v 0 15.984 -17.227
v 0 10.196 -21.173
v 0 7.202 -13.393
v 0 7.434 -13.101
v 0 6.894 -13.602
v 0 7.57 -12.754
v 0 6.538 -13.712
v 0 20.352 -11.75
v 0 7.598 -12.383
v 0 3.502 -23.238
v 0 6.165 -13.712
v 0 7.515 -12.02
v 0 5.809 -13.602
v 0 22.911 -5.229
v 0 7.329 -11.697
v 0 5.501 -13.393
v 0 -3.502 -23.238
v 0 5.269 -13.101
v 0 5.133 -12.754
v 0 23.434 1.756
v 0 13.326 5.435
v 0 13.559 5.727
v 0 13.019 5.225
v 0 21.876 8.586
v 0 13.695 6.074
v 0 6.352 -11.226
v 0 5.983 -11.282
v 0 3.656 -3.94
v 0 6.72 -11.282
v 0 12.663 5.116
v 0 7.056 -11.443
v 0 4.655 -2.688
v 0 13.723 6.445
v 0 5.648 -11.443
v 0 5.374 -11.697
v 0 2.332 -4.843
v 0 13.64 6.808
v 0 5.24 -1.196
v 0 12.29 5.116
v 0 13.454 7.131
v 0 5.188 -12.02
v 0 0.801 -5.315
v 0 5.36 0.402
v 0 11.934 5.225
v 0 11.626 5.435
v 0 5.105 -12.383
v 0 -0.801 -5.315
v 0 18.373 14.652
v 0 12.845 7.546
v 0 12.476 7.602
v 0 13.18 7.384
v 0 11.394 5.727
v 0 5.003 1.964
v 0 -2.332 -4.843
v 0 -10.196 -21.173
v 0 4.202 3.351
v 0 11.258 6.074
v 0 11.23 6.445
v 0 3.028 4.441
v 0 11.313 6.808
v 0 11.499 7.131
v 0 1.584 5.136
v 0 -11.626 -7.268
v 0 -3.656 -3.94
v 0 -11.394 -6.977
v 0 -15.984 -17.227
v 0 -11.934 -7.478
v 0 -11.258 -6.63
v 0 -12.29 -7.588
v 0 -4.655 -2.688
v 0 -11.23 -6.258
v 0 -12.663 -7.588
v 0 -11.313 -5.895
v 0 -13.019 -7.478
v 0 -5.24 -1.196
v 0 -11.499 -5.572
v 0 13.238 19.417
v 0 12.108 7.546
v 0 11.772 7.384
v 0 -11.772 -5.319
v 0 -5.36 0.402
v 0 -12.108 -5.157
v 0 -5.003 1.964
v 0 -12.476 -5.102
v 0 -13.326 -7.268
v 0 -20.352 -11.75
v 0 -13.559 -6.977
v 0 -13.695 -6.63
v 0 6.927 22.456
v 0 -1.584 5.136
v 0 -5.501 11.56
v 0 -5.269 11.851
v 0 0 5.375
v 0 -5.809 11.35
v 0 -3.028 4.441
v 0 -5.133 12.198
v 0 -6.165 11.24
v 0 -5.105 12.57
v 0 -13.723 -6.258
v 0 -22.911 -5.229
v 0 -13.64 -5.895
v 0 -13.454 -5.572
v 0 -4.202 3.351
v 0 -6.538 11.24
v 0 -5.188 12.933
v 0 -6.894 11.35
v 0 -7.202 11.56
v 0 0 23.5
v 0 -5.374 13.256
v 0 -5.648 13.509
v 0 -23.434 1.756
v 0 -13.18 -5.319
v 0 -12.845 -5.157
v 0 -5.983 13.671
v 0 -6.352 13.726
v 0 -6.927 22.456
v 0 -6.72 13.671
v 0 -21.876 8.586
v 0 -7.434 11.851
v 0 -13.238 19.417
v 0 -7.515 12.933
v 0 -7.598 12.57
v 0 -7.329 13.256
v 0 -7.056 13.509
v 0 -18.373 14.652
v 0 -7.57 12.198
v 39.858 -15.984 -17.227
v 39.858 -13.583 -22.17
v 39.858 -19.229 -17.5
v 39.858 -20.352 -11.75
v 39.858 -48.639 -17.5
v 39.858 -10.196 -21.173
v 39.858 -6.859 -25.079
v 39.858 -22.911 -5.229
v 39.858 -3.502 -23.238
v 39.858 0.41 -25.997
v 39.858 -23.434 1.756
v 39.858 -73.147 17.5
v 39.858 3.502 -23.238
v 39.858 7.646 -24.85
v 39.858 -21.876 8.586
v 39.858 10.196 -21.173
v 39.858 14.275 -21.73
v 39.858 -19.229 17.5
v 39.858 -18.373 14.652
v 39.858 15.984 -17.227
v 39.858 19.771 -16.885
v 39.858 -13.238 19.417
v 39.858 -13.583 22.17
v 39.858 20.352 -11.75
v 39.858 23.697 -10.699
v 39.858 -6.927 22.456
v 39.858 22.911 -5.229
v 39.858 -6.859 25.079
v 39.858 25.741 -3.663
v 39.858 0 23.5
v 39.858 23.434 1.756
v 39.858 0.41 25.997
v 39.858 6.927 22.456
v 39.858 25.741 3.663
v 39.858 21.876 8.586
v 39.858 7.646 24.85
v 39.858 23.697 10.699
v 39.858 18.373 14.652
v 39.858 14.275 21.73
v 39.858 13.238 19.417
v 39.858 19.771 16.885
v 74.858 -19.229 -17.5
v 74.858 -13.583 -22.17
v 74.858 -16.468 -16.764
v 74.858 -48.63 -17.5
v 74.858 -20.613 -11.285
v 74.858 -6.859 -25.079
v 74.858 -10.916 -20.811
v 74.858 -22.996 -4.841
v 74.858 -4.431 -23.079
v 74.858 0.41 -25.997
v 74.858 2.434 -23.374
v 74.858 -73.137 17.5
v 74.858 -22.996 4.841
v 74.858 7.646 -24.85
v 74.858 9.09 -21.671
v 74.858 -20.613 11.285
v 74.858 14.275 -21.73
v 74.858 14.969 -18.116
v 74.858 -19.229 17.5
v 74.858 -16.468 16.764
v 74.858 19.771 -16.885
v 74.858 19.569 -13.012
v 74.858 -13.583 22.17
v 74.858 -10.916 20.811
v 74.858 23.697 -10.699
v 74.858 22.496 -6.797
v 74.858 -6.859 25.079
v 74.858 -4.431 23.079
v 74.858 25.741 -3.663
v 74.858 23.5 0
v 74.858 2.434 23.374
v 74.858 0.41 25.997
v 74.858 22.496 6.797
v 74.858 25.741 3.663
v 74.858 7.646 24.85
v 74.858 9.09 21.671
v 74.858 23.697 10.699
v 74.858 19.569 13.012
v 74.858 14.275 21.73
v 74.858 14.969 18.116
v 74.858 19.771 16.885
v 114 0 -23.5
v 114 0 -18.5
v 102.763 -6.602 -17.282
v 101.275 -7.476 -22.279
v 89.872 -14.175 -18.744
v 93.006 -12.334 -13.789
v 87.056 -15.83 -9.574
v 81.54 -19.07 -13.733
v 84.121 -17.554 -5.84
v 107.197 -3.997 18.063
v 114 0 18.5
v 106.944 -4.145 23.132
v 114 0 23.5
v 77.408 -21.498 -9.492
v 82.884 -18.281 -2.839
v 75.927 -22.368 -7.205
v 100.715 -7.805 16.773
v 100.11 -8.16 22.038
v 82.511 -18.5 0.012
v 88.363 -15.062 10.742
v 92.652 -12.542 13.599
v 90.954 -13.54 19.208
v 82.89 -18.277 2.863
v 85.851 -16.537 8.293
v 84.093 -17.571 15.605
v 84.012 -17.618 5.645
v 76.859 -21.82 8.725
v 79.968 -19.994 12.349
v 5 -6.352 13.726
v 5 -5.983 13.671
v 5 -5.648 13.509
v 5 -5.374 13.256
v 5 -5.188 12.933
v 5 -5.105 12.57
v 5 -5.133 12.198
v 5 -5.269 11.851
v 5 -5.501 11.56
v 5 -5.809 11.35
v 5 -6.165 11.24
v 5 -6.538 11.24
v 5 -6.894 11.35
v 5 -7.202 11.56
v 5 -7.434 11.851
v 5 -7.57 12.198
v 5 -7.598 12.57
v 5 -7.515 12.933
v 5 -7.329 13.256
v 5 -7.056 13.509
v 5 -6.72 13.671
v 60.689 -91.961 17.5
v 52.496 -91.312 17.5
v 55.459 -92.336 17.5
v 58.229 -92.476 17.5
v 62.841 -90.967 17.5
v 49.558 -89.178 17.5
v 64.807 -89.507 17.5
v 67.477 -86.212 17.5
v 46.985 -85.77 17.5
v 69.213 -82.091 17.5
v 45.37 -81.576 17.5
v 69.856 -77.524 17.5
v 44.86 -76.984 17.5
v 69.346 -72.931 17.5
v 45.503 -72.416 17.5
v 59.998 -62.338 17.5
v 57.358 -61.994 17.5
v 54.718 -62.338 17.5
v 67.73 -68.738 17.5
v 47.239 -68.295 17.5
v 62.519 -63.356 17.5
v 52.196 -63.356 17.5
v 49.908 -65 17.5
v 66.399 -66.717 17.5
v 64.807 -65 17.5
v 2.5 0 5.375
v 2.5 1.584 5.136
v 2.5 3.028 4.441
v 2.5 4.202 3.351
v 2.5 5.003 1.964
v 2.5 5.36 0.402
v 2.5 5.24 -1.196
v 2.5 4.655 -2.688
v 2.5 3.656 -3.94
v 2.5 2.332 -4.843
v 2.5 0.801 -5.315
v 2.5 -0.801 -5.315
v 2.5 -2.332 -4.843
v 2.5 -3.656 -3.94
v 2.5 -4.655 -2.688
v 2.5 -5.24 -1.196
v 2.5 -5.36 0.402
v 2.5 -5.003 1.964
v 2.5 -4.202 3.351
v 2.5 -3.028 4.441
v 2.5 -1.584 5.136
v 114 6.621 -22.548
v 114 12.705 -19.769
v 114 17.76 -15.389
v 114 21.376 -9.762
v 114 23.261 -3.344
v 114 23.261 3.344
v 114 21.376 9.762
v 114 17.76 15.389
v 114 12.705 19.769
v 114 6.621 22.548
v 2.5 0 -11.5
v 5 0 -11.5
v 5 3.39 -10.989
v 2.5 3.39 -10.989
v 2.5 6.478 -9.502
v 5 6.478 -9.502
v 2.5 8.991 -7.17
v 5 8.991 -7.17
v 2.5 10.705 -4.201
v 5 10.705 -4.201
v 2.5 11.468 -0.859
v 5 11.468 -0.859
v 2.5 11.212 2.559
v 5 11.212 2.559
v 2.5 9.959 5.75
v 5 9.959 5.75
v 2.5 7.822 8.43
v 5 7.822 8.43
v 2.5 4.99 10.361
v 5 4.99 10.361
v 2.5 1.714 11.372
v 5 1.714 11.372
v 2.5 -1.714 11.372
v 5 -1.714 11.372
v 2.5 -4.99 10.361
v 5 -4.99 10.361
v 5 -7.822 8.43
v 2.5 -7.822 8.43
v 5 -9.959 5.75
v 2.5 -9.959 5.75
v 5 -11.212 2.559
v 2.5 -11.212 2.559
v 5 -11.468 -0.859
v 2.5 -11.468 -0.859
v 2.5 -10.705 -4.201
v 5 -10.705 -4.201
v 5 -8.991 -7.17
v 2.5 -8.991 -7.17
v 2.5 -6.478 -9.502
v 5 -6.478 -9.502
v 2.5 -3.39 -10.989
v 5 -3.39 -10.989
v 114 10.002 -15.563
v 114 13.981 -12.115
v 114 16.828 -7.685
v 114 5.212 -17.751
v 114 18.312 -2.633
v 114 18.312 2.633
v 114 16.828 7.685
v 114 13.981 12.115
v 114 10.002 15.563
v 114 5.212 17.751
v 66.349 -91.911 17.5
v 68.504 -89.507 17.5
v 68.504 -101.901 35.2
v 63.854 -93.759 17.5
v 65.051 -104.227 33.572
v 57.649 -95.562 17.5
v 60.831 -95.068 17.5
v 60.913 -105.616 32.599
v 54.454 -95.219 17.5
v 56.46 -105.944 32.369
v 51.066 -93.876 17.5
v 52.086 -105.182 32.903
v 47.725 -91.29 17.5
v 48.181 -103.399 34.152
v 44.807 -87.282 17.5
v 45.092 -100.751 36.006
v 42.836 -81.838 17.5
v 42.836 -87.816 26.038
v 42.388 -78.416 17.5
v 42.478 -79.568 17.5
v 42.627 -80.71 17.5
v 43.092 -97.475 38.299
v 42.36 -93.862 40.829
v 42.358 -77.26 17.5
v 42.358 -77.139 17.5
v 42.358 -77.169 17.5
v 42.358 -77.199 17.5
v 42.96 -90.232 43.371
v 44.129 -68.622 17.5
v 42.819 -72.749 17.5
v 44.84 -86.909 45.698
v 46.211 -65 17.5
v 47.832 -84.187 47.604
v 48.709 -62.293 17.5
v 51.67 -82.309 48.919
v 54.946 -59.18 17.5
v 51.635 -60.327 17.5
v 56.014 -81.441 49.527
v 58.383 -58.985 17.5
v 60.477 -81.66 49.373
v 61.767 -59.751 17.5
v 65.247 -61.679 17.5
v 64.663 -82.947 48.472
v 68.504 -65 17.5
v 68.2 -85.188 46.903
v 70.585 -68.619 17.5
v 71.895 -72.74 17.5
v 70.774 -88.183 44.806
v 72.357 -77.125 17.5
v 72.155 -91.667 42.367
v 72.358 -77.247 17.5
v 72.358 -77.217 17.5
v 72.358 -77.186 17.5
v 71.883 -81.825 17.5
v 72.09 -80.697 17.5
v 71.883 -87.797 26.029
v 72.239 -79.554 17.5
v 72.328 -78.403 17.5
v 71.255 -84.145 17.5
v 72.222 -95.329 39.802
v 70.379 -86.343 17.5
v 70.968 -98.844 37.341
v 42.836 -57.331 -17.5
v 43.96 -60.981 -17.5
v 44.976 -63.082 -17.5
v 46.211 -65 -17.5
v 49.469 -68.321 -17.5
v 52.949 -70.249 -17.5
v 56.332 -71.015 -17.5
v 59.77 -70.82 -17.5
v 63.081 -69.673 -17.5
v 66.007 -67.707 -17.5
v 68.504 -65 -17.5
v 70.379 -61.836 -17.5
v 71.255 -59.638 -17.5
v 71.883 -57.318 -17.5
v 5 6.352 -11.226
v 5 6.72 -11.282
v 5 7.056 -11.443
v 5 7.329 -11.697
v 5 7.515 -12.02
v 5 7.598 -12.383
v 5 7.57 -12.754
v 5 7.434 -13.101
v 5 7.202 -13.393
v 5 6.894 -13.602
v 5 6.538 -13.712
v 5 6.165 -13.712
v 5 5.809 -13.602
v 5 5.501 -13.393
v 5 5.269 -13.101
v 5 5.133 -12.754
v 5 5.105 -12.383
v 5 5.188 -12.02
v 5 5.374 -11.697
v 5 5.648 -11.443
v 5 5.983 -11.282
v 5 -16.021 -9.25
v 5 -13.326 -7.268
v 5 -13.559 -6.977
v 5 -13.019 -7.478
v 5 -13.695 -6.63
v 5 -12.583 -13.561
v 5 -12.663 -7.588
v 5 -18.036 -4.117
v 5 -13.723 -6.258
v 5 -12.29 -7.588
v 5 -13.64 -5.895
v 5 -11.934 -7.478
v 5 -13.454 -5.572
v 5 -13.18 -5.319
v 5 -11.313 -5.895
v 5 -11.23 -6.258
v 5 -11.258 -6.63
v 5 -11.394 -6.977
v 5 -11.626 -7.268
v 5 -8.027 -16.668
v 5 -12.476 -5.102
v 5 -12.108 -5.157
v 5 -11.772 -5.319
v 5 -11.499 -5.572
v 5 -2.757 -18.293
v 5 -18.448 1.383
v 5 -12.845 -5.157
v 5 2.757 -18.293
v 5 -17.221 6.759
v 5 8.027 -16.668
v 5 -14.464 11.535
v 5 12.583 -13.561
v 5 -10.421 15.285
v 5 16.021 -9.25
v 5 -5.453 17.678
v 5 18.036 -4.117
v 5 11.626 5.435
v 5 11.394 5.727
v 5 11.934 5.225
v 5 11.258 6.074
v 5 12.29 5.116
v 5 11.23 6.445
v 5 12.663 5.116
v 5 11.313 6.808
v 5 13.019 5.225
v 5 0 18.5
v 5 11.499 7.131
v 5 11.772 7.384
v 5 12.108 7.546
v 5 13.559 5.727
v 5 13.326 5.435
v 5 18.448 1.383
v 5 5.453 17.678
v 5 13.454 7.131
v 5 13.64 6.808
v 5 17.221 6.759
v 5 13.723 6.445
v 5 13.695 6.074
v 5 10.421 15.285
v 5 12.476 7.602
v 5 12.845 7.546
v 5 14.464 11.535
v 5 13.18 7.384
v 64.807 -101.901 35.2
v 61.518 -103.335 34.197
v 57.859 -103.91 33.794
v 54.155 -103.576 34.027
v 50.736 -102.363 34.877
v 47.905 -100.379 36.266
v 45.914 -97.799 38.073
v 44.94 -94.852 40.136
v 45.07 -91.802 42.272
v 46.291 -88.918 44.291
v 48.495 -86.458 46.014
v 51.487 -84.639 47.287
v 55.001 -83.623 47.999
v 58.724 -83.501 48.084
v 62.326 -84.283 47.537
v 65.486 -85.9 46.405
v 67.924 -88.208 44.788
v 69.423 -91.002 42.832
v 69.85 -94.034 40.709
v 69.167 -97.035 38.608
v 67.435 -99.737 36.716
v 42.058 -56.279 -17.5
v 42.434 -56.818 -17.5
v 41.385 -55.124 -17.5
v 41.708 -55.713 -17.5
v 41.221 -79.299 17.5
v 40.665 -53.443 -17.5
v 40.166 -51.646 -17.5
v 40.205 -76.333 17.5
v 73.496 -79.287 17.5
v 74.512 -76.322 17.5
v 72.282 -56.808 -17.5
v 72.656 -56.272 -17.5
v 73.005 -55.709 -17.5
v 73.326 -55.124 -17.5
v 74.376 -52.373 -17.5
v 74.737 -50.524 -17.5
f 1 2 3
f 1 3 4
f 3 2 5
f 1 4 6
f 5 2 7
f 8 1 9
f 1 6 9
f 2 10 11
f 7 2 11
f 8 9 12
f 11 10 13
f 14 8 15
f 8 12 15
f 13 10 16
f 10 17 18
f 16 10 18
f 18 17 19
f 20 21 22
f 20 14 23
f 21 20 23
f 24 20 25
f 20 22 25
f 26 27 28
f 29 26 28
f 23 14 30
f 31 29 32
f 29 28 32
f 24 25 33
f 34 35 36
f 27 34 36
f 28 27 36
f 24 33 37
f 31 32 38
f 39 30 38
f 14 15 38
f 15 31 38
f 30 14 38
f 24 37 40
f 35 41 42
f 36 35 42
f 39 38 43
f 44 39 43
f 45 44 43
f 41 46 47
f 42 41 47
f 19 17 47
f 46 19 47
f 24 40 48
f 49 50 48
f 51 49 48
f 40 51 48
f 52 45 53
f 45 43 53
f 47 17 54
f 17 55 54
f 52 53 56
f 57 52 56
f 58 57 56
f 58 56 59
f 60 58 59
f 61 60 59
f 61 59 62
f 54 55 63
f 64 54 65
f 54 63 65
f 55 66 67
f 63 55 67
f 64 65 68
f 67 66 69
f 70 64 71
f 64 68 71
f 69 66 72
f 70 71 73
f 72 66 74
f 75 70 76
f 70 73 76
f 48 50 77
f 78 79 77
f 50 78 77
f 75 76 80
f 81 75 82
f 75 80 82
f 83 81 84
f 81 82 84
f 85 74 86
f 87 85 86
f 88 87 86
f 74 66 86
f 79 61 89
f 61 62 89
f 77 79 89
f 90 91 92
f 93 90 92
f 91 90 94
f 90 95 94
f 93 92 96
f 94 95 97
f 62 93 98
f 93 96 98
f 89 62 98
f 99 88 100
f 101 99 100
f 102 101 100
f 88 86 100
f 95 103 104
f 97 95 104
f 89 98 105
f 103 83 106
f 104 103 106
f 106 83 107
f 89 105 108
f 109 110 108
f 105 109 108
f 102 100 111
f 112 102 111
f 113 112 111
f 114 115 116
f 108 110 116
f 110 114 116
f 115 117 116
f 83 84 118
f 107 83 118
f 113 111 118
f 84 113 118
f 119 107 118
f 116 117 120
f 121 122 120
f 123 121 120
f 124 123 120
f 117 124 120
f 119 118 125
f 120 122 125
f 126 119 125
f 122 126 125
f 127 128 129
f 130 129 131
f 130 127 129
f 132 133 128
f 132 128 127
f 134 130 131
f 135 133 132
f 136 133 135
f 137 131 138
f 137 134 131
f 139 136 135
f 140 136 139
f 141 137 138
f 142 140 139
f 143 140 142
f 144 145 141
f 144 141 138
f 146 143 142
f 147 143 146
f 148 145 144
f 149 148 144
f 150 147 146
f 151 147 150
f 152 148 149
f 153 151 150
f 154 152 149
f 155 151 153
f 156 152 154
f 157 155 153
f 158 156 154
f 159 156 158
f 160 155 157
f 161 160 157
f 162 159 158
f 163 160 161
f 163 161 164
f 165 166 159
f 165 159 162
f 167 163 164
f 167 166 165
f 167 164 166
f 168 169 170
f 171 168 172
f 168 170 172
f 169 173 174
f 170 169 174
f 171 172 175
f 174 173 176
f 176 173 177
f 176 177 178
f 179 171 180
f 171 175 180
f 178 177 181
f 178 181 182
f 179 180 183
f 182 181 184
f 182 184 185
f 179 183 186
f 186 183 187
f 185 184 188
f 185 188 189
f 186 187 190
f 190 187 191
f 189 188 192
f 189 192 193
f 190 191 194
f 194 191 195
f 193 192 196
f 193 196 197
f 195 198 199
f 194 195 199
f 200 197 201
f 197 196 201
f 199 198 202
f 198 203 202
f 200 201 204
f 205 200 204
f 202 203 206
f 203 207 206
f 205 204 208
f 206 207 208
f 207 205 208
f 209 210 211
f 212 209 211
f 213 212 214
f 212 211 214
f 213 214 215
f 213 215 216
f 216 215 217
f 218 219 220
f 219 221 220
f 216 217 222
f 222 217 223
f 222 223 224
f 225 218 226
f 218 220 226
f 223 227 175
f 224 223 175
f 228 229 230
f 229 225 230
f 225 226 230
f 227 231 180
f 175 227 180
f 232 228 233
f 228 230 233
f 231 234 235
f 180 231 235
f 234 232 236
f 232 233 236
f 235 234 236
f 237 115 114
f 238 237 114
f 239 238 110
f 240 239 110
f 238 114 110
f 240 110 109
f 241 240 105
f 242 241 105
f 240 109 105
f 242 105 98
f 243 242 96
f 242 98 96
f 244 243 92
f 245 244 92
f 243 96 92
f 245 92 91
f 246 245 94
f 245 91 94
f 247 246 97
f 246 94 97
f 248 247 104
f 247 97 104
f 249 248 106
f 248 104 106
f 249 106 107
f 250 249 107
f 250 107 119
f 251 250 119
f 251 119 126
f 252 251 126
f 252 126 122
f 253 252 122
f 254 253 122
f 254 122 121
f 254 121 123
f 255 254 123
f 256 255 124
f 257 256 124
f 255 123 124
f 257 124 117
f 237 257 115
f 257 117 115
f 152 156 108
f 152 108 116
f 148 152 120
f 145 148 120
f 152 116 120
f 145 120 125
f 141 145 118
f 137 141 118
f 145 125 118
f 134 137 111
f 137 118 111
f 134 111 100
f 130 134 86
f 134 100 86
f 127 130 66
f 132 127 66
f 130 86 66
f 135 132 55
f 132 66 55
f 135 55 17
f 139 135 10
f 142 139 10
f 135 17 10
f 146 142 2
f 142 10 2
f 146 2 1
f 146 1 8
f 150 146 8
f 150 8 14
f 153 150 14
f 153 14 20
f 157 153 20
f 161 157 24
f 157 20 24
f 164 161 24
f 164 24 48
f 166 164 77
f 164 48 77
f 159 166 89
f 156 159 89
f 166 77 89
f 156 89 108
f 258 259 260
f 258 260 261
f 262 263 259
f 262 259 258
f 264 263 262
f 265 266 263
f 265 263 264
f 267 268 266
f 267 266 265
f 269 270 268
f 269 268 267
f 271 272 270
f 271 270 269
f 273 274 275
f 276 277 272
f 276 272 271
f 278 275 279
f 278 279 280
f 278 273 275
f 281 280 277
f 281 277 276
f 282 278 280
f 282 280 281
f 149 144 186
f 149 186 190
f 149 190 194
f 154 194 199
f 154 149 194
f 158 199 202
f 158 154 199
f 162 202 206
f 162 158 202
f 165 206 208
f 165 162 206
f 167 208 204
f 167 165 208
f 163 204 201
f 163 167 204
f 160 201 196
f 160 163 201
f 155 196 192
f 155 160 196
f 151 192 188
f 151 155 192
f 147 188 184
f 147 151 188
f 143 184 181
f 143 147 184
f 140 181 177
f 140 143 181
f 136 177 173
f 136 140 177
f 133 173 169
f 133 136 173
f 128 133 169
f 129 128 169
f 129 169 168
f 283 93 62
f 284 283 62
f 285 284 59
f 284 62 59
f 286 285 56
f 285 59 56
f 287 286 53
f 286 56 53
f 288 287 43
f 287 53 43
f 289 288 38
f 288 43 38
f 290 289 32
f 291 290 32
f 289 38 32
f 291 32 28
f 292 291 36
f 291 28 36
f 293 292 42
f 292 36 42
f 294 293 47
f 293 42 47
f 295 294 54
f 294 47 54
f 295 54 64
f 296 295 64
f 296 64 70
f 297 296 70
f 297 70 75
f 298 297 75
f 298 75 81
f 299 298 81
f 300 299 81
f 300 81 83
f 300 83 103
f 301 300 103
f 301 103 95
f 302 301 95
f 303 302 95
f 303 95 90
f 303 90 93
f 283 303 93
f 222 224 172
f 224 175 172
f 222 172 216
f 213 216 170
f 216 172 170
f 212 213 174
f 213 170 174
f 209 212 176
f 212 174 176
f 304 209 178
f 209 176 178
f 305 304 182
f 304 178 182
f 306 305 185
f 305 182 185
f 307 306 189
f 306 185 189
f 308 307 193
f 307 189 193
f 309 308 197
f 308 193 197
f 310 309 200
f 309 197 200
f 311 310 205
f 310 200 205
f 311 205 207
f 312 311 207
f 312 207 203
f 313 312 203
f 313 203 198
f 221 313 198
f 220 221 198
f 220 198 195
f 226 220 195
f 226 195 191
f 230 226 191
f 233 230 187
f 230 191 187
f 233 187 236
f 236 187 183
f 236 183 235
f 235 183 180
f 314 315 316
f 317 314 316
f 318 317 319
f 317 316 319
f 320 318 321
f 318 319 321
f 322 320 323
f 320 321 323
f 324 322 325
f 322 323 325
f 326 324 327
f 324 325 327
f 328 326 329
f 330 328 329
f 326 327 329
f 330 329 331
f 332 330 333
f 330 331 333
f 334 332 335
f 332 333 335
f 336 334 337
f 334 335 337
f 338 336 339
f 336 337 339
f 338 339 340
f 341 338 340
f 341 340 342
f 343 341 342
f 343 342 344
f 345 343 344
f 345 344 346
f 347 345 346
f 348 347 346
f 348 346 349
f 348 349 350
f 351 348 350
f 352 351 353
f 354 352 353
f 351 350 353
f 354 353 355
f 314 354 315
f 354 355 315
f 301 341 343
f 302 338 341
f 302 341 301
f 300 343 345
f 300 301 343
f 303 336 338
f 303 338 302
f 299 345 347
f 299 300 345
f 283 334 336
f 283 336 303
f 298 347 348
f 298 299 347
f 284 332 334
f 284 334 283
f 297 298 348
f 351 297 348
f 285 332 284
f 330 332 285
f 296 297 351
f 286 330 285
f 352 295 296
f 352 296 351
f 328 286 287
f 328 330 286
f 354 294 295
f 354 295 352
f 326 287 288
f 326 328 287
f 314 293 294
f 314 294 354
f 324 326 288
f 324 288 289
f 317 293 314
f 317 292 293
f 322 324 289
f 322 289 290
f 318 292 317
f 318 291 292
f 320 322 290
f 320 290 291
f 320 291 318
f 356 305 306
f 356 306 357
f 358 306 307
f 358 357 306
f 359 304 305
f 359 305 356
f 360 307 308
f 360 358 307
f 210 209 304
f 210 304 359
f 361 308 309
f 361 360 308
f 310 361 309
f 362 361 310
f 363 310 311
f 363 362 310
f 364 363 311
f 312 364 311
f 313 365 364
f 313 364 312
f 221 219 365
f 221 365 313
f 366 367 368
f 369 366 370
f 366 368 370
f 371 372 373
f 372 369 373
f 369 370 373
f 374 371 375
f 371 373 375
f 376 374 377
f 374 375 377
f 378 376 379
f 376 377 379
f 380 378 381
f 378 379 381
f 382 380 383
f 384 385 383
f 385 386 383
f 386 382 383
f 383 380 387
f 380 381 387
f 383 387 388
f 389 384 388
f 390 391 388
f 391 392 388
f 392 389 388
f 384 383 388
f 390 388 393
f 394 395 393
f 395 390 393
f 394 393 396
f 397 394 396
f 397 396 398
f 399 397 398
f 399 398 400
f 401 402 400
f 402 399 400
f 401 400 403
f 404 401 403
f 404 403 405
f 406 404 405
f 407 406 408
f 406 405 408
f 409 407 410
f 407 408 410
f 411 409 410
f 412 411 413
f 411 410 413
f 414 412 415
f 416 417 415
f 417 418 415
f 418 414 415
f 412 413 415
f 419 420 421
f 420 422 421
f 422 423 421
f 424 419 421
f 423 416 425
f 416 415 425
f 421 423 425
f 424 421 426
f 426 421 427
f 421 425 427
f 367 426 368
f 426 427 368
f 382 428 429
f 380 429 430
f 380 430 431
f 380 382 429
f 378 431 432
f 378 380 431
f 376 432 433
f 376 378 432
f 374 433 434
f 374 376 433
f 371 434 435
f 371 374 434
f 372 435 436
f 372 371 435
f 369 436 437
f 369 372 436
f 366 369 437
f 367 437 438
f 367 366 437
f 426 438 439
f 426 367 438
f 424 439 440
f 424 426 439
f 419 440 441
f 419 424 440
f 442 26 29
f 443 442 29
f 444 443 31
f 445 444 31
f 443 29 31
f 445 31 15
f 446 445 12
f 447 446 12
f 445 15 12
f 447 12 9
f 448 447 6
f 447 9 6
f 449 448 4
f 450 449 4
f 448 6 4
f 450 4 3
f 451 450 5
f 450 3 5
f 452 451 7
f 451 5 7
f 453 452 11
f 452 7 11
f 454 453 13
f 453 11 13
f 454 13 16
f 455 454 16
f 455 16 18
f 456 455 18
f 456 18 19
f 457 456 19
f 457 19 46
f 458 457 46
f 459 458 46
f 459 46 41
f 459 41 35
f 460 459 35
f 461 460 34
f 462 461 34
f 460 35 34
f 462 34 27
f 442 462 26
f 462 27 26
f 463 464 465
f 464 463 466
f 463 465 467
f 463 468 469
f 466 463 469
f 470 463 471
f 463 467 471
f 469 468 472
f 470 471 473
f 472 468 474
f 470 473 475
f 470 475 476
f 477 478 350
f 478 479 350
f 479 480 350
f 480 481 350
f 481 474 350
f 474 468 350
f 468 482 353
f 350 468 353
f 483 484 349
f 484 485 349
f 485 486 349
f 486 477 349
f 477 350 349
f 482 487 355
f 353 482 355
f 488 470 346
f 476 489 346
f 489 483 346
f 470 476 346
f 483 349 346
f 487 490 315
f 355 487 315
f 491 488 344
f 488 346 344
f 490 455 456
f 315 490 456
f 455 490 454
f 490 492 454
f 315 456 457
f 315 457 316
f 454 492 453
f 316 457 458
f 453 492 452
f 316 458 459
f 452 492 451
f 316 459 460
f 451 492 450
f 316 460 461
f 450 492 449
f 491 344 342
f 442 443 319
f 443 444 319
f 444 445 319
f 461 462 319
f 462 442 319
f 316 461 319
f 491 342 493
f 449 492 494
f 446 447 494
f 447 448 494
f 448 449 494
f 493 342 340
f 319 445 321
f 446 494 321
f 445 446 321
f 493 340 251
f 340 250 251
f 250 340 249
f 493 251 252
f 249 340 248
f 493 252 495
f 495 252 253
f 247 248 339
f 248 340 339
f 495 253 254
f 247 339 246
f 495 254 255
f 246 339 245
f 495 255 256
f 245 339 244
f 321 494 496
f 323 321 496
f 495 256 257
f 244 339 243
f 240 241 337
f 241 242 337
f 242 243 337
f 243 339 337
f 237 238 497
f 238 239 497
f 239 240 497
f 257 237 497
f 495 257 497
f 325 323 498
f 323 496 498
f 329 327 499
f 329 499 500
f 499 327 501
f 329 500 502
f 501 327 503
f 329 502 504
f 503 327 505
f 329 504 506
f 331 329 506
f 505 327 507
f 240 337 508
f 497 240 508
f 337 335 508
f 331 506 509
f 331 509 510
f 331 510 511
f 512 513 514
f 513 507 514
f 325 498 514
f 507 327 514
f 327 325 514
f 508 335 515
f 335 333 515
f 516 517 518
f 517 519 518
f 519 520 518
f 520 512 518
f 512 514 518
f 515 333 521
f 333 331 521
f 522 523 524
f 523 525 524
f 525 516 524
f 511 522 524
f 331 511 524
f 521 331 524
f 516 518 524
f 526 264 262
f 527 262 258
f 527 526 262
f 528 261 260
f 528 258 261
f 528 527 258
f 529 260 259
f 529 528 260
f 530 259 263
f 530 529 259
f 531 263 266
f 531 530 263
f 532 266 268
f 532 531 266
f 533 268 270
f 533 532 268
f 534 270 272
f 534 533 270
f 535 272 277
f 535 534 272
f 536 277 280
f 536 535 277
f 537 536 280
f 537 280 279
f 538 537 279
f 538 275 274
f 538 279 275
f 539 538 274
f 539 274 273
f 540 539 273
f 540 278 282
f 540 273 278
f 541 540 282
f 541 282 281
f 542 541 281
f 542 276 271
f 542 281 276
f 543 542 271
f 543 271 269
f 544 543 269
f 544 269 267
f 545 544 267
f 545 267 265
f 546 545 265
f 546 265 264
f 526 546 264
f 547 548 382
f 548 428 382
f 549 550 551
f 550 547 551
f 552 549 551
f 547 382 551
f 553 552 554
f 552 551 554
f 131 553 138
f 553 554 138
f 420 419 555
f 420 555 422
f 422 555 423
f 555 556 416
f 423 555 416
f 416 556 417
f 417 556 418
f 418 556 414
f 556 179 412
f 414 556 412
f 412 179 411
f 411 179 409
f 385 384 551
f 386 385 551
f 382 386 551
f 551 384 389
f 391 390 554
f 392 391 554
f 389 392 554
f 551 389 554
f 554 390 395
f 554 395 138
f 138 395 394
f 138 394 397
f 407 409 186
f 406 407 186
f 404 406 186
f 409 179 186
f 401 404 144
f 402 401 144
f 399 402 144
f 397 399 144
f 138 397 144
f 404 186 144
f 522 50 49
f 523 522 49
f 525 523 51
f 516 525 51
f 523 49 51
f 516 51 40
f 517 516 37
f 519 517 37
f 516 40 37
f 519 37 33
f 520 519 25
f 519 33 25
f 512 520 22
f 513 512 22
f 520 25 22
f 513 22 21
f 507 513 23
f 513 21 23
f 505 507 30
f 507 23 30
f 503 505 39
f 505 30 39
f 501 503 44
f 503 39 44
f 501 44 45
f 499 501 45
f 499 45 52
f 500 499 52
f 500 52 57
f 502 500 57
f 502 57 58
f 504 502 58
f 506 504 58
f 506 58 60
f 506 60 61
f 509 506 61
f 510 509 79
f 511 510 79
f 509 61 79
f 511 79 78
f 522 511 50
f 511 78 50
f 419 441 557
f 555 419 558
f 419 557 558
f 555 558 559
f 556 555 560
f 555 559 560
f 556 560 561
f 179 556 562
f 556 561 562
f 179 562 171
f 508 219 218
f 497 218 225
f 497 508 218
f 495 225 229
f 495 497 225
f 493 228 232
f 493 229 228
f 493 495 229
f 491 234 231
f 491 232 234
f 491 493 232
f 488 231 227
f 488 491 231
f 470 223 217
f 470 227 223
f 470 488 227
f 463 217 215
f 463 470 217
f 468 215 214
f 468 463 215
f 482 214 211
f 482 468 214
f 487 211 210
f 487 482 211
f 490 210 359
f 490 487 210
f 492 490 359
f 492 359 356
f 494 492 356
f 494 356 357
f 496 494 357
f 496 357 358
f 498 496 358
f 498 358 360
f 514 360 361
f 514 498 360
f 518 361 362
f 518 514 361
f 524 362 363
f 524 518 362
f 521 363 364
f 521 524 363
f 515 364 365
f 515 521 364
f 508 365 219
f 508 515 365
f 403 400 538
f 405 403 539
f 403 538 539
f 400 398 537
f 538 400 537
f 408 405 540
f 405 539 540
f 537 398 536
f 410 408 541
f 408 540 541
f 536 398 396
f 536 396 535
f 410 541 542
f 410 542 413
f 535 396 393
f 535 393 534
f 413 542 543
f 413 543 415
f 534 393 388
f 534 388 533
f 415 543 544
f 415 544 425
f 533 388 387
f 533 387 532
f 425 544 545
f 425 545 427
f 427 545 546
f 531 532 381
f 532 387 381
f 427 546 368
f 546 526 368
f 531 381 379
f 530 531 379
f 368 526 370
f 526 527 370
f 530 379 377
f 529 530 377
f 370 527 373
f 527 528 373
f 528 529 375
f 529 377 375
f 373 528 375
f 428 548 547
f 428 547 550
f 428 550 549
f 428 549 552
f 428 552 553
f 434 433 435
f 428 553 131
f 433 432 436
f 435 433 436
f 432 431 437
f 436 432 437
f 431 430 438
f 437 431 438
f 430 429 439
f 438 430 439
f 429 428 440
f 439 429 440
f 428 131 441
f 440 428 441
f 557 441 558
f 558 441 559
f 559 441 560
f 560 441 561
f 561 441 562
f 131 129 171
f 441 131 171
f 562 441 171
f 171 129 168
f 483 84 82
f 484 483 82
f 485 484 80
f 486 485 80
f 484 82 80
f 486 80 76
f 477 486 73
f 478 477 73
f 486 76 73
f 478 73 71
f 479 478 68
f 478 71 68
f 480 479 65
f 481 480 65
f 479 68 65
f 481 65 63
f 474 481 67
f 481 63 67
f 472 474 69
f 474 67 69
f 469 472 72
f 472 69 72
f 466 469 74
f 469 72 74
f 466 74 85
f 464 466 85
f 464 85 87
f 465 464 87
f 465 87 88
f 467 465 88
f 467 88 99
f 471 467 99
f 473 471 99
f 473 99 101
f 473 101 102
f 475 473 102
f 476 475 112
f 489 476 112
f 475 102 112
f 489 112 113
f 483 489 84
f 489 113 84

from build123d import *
from build123d.topology import SkipClean

# Parameters (mm, degrees)
CROQUIS1_R              = 23.5
CROQUIS1_R_2            = 18.5
SALIENTE_EXTRUIR1_DEPTH = 114
CROQUIS2_R              = 23.5
CROQUIS2_R_2            = 5.375
CROQUIS2_R_3            = 1.25
SALIENTE_EXTRUIR2_DEPTH = 5
CORTAR_EXTRUIR1_DEPTH   = 23.5
CROQUIS6_R              = 11.5
CORTAR_EXTRUIR2_DEPTH   = 2.5
CROQUIS17_W             = 35
CROQUIS17_H             = 35
SALIENTE_EXTRUIR3_DEPTH = 65
CROQUIS18_R             = 15
CROQUIS18_R_2           = 12.5
SALIENTE_EXTRUIR4_DEPTH = 70
CROQUIS26_W             = 35
CROQUIS26_H             = 35
SALIENTE_EXTRUIR8_DEPTH = 40
CORTAR_EXTRUIR4_DEPTH   = 167.48351172
REDONDEO1_R             = 10
CROQUIS27_R             = 26
SALIENTE_EXTRUIR9_DEPTH = 35
CORTAR_EXTRUIR7_START   = -35
CROQUIS28_R             = 18.5
CORTAR_EXTRUIR7_DEPTH   = 35
CROQUIS25_W             = 13.336801646
CROQUIS25_H             = 44.473979809
CORTAR_EXTRUIR8_DEPTH   = 35


with BuildPart() as part:
    # Croquis1 → Saliente-Extruir1 (new body)
    with BuildSketch(Plane(origin=(0, 0, 0), x_dir=(0, 0, -1), z_dir=(1, 0, 0))):
        with Locations(Location((0, 0, 0), (0, 0, 180))):
            Circle(CROQUIS1_R)
        with Locations(Location((0, 0, 0), (0, 0, 180))):
            Circle(CROQUIS1_R_2, mode=Mode.SUBTRACT)
    extrude(amount=SALIENTE_EXTRUIR1_DEPTH)

    # Croquis2 → Saliente-Extruir2 (add)
    with BuildSketch(Plane.ZY):
        Circle(CROQUIS2_R)
        Circle(CROQUIS2_R_2, mode=Mode.SUBTRACT)
        with Locations((-12.476232327, 6.351663319)):
            Circle(CROQUIS2_R_3, mode=Mode.SUBTRACT)
        with Locations((-6.351663319, -12.476232327)):
            Circle(CROQUIS2_R_3, mode=Mode.SUBTRACT)
        with Locations((12.476232327, -6.351663319)):
            Circle(CROQUIS2_R_3, mode=Mode.SUBTRACT)
        with Locations((6.351663319, 12.476232327)):
            Circle(CROQUIS2_R_3, mode=Mode.SUBTRACT)
    extrude(amount=-SALIENTE_EXTRUIR2_DEPTH)

    # Croquis4 → Cortar-Extruir1 (cut, symmetric)
    with BuildSketch(Plane.XY):
        Polygon((114, 0), (74, -23.5), (114, -23.5), align=None)
    extrude(amount=CORTAR_EXTRUIR1_DEPTH, both=True, mode=Mode.SUBTRACT)

    # Croquis6 → Cortar-Extruir2 (cut)
    with BuildSketch(Plane(origin=(5, 0, 0), x_dir=(0, 0, -1), z_dir=(1, 0, 0))):
        Circle(CROQUIS6_R)
    extrude(amount=-CORTAR_EXTRUIR2_DEPTH, mode=Mode.SUBTRACT)

    # Croquis17 → Saliente-Extruir3 (add)
    with BuildSketch(Plane(origin=(0, 0, 0), x_dir=(1, 0, 0), z_dir=(0, 1, 0))):
        with Locations((57.357864376, 0)):
            Rectangle(CROQUIS17_W, CROQUIS17_H)
    extrude(amount=-SALIENTE_EXTRUIR3_DEPTH)

    # Croquis18 → Saliente-Extruir4 (add)
    with BuildSketch(Plane(origin=(57.357864376, -93.678821818, 40.957602214), x_dir=(-1, 0, 0), z_dir=(3.885780586188049e-15, 0.5735764363510475, -0.8191520442889909))):
        with Locations(Location((0, 0, 0), (0, 0, 222.003230743))):
            Circle(CROQUIS18_R)
        with Locations(Location((0, 0, 0), (0, 0, 233.418217826))):
            Circle(CROQUIS18_R_2, mode=Mode.SUBTRACT)
    extrude(amount=SALIENTE_EXTRUIR4_DEPTH)

    # Croquis26 → Saliente-Extruir8 (add)
    with BuildSketch(Plane.XZ.offset(65)):
        with Locations((57.357864376, 0)):
            Rectangle(CROQUIS26_W, CROQUIS26_H)
    extrude(amount=SALIENTE_EXTRUIR8_DEPTH)

    # Croquis23 → Cortar-Extruir4 (cut, through all)
    with SkipClean():  # the faces are left unmerged after this step: merging them gives an invalid solid
        with BuildSketch(Plane(origin=(0, -50.063167159, 71.49761239), x_dir=(-0.9999999349220849, -0.00029552642887780036, -0.0002069298332451758), z_dir=(-3.88580769124236e-15, -0.5735764363510474, 0.819152044288991))):
            with BuildLine():
                Line((-72.338651426, 53.265572477), (-106.285107353, 53.265572477))
                ThreePointArc((-106.285107353, 53.265572477), (-57.338651426, 102.212028404), (-8.392195499, 53.265572477))
                Line((-8.392195499, 53.265572477), (-42.338651426, 53.265572477))
                ThreePointArc((-42.338651426, 53.265572477), (-57.338651426, 68.265572477), (-72.338651426, 53.265572477))
            make_face()
        extrude(amount=-CORTAR_EXTRUIR4_DEPTH, mode=Mode.SUBTRACT)

    # Chaflán1
    # the kernel refuses this chamfer: 5 mm, written as the material it adds along each edge
    with BuildSketch(Plane(origin=(72.3578634, -83.735162365, 26.766019567), x_dir=(0.9996237628252941, 0.0224682639001608, 0.015732447753382475), z_dir=(3.88580769124236e-15, 0.5735764363510474, -0.819152044288991))) as chafl_n1_piece_1_section:
        with BuildLine():
            Line((4.52468849, 0), (-0.739014204, 3.853882904))
            Line((-0.739014204, 3.853882904), (-0.835126609, 3.826271211))
            ThreePointArc((-0.835126609, 3.826271211), (-0.28053556, 1.941134087), (-0.099963359, -0.002706805))
            Line((-0.099963359, -0.002706805), (0.002706805, -0.099963359))
            ThreePointArc((0.002706805, -0.099963359), (2.263393477, -0.038748553), (4.527395295, -0.099963359))
            Line((4.527395295, -0.099963359), (4.52468849, 0))
        make_face()
    chafl_n1_piece_1 = extrude(amount=65.350553059, mode=Mode.PRIVATE)
    chafl_n1_piece_1 = split(chafl_n1_piece_1, bisect_by=Plane(origin=(74.857864376, -66.849730794, 0.212642444), z_dir=(-1, 0, 0)), keep=Keep.TOP, mode=Mode.PRIVATE)
    chafl_n1_piece_1 = split(chafl_n1_piece_1, bisect_by=Plane(origin=(73.269970471, -66.849730794, -17.5), z_dir=(0, 0, 1)), keep=Keep.TOP, mode=Mode.PRIVATE)
    chafl_n1_piece_1 = split(chafl_n1_piece_1, bisect_by=Plane(origin=(73.269970471, -66.849730794, 17.5), z_dir=(0, 0, -1)), keep=Keep.TOP, mode=Mode.PRIVATE)
    chafl_n1_piece_1 = split(chafl_n1_piece_1, bisect_by=Plane(origin=(73.269970471, -54.669749998, -17.182172852), z_dir=(-3.8857805861880495e-15, -0.5735764363510475, 0.8191520442889909)), keep=Keep.TOP, mode=Mode.PRIVATE)
    add(chafl_n1_piece_1)
    with BuildSketch(Plane(origin=(72.3578634, -83.735162365, 26.766019567), x_dir=(0.9996237628252941, 0.0224682639001608, 0.015732447753382475), z_dir=(3.88580769124236e-15, 0.5735764363510474, -0.819152044288991))) as chafl_n1_piece_2_section:
        with BuildLine():
            Line((4.52468849, 0), (-0.739014204, 3.853882904))
            Line((-0.739014204, 3.853882904), (-0.835126609, 3.826271211))
            ThreePointArc((-0.835126609, 3.826271211), (-0.28053556, 1.941134087), (-0.099963359, -0.002706805))
            Line((-0.099963359, -0.002706805), (0.002706805, -0.099963359))
            ThreePointArc((0.002706805, -0.099963359), (2.263393477, -0.038748553), (4.527395295, -0.099963359))
            Line((4.527395295, -0.099963359), (4.52468849, 0))
        make_face()
    chafl_n1_piece_2 = extrude(amount=65.350553059, mode=Mode.PRIVATE)
    chafl_n1_piece_2 = split(chafl_n1_piece_2, bisect_by=Plane(origin=(72.410675533, -56.139333536, -17.5), z_dir=(0, 0, -1)), keep=Keep.TOP, mode=Mode.PRIVATE)
    chafl_n1_piece_2 = split(chafl_n1_piece_2, bisect_by=Plane(origin=(72.410675533, -55.939365699, -18.071167337), z_dir=(-3.8857805861880495e-15, -0.5735764363510475, 0.8191520442889909)), keep=Keep.TOP, mode=Mode.PRIVATE)
    add(chafl_n1_piece_2)
    with BuildSketch(Plane(origin=(72.3578634, -83.735162365, 26.766019567), x_dir=(0.9996237628252941, 0.0224682639001608, 0.015732447753382475), z_dir=(3.88580769124236e-15, 0.5735764363510474, -0.819152044288991))) as chafl_n1_piece_3_section:
        with BuildLine():
            Line((4.52468849, 0), (-0.739014204, 3.853882904))
            Line((-0.739014204, 3.853882904), (-0.835126609, 3.826271211))
            ThreePointArc((-0.835126609, 3.826271211), (-0.28053556, 1.941134087), (-0.099963359, -0.002706805))
            Line((-0.099963359, -0.002706805), (0.002706805, -0.099963359))
            ThreePointArc((0.002706805, -0.099963359), (2.263393477, -0.038748553), (4.527395295, -0.099963359))
            Line((4.527395295, -0.099963359), (4.52468849, 0))
        make_face()
    chafl_n1_piece_3 = extrude(amount=65.350553059, mode=Mode.PRIVATE)
    chafl_n1_piece_3 = split(chafl_n1_piece_3, bisect_by=Plane(origin=(74.857864376, -53.732391069, -17.108811543), z_dir=(-1, 0, 0)), keep=Keep.TOP, mode=Mode.PRIVATE)
    chafl_n1_piece_3 = split(chafl_n1_piece_3, bisect_by=Plane(origin=(73.550293703, -53.732391069, -17.5), z_dir=(0, 0, 1)), keep=Keep.TOP, mode=Mode.PRIVATE)
    chafl_n1_piece_3 = split(chafl_n1_piece_3, bisect_by=Plane(origin=(73.550293703, -54.006304175, -16.717623086), z_dir=(3.8857805861880495e-15, 0.5735764363510475, -0.8191520442889909)), keep=Keep.TOP, mode=Mode.PRIVATE)
    add(chafl_n1_piece_3)
    with BuildSketch(Plane(origin=(42.357865352, -83.748374972, 26.766019567), x_dir=(0.1620303972007153, -0.8083275784914744, -0.5659970638025322), z_dir=(3.88580769124236e-15, 0.5735764363510474, -0.819152044288991))) as chafl_n1_piece_4_section:
        with BuildLine():
            Line((3.924099314, 0), (-0.852121415, 4.443725355))
            Line((-0.852121415, 4.443725355), (-0.950805831, 4.427557917))
            ThreePointArc((-0.950805831, 4.427557917), (-0.464313507, 2.215595733), (-0.098684416, -0.016167438))
            Line((-0.098684416, -0.016167438), (0.016167438, -0.098684416))
            ThreePointArc((0.016167438, -0.098684416), (1.959232583, 0.090052375), (3.915082265, -0.099592634))
            Line((3.915082265, -0.099592634), (3.924099314, 0))
        make_face()
    chafl_n1_piece_4 = extrude(amount=65.350553059, mode=Mode.PRIVATE)
    chafl_n1_piece_4 = split(chafl_n1_piece_4, bisect_by=Plane(origin=(41.446565804, -66.861949612, -17.5), z_dir=(0, 0, 1)), keep=Keep.TOP, mode=Mode.PRIVATE)
    chafl_n1_piece_4 = split(chafl_n1_piece_4, bisect_by=Plane(origin=(39.857864376, -66.861949612, 0.210272202), z_dir=(1, 0, 0)), keep=Keep.TOP, mode=Mode.PRIVATE)
    chafl_n1_piece_4 = split(chafl_n1_piece_4, bisect_by=Plane(origin=(41.446565804, -66.861949612, 17.5), z_dir=(0, 0, -1)), keep=Keep.TOP, mode=Mode.PRIVATE)
    chafl_n1_piece_4 = split(chafl_n1_piece_4, bisect_by=Plane(origin=(41.446565804, -54.679062597, -17.188693604), z_dir=(-3.8857805861880495e-15, -0.5735764363510475, 0.8191520442889909)), keep=Keep.TOP, mode=Mode.PRIVATE)
    add(chafl_n1_piece_4)
    with BuildSketch(Plane(origin=(42.357865352, -83.748374972, 26.766019567), x_dir=(0.1620303972007153, -0.8083275784914744, -0.5659970638025322), z_dir=(3.88580769124236e-15, 0.5735764363510474, -0.819152044288991))) as chafl_n1_piece_5_section:
        with BuildLine():
            Line((3.924099314, 0), (-0.852121415, 4.443725355))
            Line((-0.852121415, 4.443725355), (-0.950805831, 4.427557917))
            ThreePointArc((-0.950805831, 4.427557917), (-0.464313507, 2.215595733), (-0.098684416, -0.016167438))
            Line((-0.098684416, -0.016167438), (0.016167438, -0.098684416))
            ThreePointArc((0.016167438, -0.098684416), (1.959232583, 0.090052375), (3.915082265, -0.099592634))
            Line((3.915082265, -0.099592634), (3.924099314, 0))
        make_face()
    chafl_n1_piece_5 = extrude(amount=65.350553059, mode=Mode.PRIVATE)
    chafl_n1_piece_5 = split(chafl_n1_piece_5, bisect_by=Plane(origin=(41.165608091, -53.740671541, -17.5), z_dir=(0, 0, 1)), keep=Keep.TOP, mode=Mode.PRIVATE)
    chafl_n1_piece_5 = split(chafl_n1_piece_5, bisect_by=Plane(origin=(39.857864376, -53.740671541, -17.111139805), z_dir=(1, 0, 0)), keep=Keep.TOP, mode=Mode.PRIVATE)
    chafl_n1_piece_5 = split(chafl_n1_piece_5, bisect_by=Plane(origin=(41.165608091, -54.012954381, -16.72227961), z_dir=(3.8857805861880495e-15, 0.5735764363510475, -0.8191520442889909)), keep=Keep.TOP, mode=Mode.PRIVATE)
    add(chafl_n1_piece_5)
    with BuildSketch(Plane(origin=(42.357865352, -83.748374972, 26.766019567), x_dir=(0.1620303972007153, -0.8083275784914744, -0.5659970638025322), z_dir=(3.88580769124236e-15, 0.5735764363510474, -0.819152044288991))) as chafl_n1_piece_6_section:
        with BuildLine():
            Line((3.924099314, 0), (-0.852121415, 4.443725355))
            Line((-0.852121415, 4.443725355), (-0.950805831, 4.427557917))
            ThreePointArc((-0.950805831, 4.427557917), (-0.464313507, 2.215595733), (-0.098684416, -0.016167438))
            Line((-0.098684416, -0.016167438), (0.016167438, -0.098684416))
            ThreePointArc((0.016167438, -0.098684416), (1.959232583, 0.090052375), (3.915082265, -0.099592634))
            Line((3.915082265, -0.099592634), (3.924099314, 0))
        make_face()
    chafl_n1_piece_6 = extrude(amount=65.350553059, mode=Mode.PRIVATE)
    chafl_n1_piece_6 = split(chafl_n1_piece_6, bisect_by=Plane(origin=(42.302537866, -56.144513508, -17.5), z_dir=(0, 0, -1)), keep=Keep.TOP, mode=Mode.PRIVATE)
    chafl_n1_piece_6 = split(chafl_n1_piece_6, bisect_by=Plane(origin=(42.302537866, -55.943525833, -18.074080294), z_dir=(-3.8857805861880495e-15, -0.5735764363510475, 0.8191520442889909)), keep=Keep.TOP, mode=Mode.PRIVATE)
    add(chafl_n1_piece_6)

    # Redondeo1
    # the kernel refuses this fillet: 10 mm, written as the material it takes off along each edge
    with BuildSketch(Plane(origin=(74.857864376, -47.604392117, -27.351708624), x_dir=(-0.7903484372830198, -0.5018597340774087, -0.35140596892489034), z_dir=(0, -0.5735764363510114, 0.8191520442890161))) as redondeo1_piece_1:
        with BuildLine():
            CenterArc((4.95618085, -9.928694439), REDONDEO1_R, 96.846328464, 45.371756964)
            Line((-2.947303523, -3.802118334), (-3.10537321, -3.679586812))
            Line((-3.10537321, -3.679586812), (-0.158069687, 0.122531522))
            Line((-0.158069687, 0.122531522), (0, 0.2))
            ThreePointArc((0, 0.2), (1.882056296, 0.2), (3.740271227, 0.198573889))
            Line((3.740271227, 0.198573889), (3.764112592, 0))
        make_face()
    extrude(amount=66.780541695, mode=Mode.SUBTRACT)
    with BuildSketch(Plane(origin=(39.857864376, -85.928316508, 27.359920723), x_dir=(0.7907902899043229, -0.5013924657655409, -0.35107878413055366), z_dir=(0, 0.5735764363510112, -0.8191520442890163))) as redondeo1_piece_2:
        with BuildLine():
            CenterArc((4.960889033, -9.928286868), REDONDEO1_R, 96.86589021, 45.393536548)
            Line((-2.947013866, -3.807415056), (-3.105171924, -3.68499762))
            Line((-3.105171924, -3.68499762), (-0.158158058, 0.122417436))
            Line((-0.158158058, 0.122417436), (0, 0.2))
            ThreePointArc((0, 0.2), (1.882715511, 0.2), (3.741521861, 0.198565737))
            Line((3.741521861, 0.198565737), (3.765431021, 0))
        make_face()
    extrude(amount=66.800591939, mode=Mode.SUBTRACT)

    # Croquis27 → Saliente-Extruir9 (add)
    with BuildSketch(Plane.ZY.offset(-39.857864376)):
        Circle(CROQUIS27_R)
    extrude(amount=-SALIENTE_EXTRUIR9_DEPTH)

    # Croquis28 → Cortar-Extruir7 (cut)
    with BuildSketch(Plane(origin=(74.857864376, 0, 0), x_dir=(0, 0, -1), z_dir=(1, 0, 0)).offset(CORTAR_EXTRUIR7_START)):
        with Locations(Location((0, 0, 0), (0, 0, 180))):
            Circle(CROQUIS28_R)
    extrude(amount=CORTAR_EXTRUIR7_DEPTH, mode=Mode.SUBTRACT)

    # Croquis25 → Cortar-Extruir8 (cut)
    with BuildSketch(Plane.ZY.offset(-39.857864376)):
        with Locations((-24.168400823, -61.036222495)):
            Rectangle(CROQUIS25_W, CROQUIS25_H)
    extrude(amount=-CORTAR_EXTRUIR8_DEPTH, mode=Mode.SUBTRACT)


solid = part.part
